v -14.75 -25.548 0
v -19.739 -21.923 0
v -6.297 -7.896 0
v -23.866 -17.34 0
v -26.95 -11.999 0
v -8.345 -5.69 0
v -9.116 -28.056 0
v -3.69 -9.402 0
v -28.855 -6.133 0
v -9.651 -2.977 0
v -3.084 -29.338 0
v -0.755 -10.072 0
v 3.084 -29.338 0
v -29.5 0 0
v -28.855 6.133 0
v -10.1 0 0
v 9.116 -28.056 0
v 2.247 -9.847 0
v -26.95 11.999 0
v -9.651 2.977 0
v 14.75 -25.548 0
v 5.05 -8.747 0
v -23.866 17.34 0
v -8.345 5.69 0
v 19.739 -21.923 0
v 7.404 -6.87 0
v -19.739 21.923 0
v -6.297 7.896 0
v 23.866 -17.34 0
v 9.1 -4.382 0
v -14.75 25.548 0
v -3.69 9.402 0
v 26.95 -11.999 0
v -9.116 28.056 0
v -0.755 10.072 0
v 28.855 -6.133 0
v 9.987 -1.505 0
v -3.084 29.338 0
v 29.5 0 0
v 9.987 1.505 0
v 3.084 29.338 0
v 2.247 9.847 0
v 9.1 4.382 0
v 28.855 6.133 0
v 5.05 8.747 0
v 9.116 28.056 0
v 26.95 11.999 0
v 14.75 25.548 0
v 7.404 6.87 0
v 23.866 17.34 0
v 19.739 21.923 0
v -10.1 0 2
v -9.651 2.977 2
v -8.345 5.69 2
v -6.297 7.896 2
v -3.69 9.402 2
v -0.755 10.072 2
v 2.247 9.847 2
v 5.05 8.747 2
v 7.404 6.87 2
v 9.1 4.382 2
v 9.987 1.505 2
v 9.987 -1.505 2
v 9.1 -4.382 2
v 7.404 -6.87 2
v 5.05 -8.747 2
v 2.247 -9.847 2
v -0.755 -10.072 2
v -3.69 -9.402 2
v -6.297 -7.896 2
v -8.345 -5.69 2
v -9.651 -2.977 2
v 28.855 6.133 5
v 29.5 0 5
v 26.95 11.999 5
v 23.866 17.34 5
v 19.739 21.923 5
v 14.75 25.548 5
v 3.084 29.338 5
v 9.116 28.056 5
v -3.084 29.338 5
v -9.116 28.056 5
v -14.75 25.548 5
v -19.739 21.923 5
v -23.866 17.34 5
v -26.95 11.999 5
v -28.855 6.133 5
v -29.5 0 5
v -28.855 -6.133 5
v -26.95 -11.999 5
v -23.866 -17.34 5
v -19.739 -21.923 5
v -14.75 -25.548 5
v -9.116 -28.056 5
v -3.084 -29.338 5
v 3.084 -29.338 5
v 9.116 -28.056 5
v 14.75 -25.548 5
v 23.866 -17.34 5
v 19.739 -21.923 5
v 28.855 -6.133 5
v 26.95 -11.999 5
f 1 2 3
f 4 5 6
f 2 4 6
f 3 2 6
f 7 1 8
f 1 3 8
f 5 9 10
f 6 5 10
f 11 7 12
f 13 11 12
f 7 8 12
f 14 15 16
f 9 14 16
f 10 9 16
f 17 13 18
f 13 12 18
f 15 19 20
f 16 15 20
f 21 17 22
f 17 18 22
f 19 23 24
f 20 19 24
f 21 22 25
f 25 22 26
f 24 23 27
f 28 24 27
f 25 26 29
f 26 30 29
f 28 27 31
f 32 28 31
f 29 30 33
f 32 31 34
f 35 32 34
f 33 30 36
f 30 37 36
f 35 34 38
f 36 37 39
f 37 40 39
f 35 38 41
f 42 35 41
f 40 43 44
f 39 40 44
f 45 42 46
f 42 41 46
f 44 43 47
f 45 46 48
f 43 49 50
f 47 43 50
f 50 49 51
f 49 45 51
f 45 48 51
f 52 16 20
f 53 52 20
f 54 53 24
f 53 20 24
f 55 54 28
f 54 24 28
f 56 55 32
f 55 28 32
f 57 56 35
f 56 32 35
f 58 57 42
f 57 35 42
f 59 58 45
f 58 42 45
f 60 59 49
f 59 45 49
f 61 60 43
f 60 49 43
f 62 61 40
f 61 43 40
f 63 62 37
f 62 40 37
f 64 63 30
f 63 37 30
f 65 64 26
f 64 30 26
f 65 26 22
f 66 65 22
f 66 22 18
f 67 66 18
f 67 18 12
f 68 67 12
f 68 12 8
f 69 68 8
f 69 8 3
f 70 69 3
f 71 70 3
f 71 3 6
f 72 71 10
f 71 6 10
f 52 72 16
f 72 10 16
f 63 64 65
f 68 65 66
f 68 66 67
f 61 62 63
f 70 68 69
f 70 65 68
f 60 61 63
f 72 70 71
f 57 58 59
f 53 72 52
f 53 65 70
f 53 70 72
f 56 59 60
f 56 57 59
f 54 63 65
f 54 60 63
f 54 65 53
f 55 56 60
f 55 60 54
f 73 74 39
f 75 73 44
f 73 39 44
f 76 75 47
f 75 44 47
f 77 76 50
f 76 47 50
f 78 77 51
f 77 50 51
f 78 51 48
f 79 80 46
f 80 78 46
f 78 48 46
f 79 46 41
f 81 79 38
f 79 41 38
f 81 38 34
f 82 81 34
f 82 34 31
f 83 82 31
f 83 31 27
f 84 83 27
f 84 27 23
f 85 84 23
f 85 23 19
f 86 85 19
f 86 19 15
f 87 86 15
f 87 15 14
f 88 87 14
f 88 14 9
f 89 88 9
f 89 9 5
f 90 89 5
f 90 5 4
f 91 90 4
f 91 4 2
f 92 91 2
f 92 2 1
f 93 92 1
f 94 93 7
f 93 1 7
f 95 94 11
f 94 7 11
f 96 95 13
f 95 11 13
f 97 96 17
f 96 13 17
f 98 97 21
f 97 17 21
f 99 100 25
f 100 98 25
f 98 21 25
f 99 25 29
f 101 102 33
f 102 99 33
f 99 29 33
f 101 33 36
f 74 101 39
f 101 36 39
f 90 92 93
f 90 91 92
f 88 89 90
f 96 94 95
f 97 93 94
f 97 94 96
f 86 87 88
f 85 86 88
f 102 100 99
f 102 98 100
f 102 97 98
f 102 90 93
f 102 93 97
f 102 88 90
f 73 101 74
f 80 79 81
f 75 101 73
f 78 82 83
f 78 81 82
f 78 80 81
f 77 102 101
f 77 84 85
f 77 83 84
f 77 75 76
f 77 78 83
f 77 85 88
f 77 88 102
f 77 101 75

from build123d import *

# Parameters (mm, degrees)
SKETCH2_R           = 29.5
BOSS_EXTRUDE1_DEPTH = 60
CUT_REVOLVE1_ANGLE  = 180
CUT_EXTRUDE1_REACH  = 12
SKETCH5_W           = 91.768804765
SKETCH5_H           = 88.75511019
SKETCH6_R           = 10.1
CUT_EXTRUDE2_DEPTH  = 2
SKETCH7_W           = 64.282541495
SKETCH7_H           = 65.701050647
CUT_EXTRUDE3_DEPTH  = 45


with BuildPart() as part:
    # Sketch2 → Boss-Extrude1 (new body)
    with BuildSketch(Plane.XY):
        Circle(SKETCH2_R)
    extrude(amount=BOSS_EXTRUDE1_DEPTH)

    # Sketch4 → Cut-Revolve1 (revolve, cut)
    with BuildSketch(Plane.XY.offset(55)):
        with BuildLine():
            Line((-16.25, 0), (16.25, 0))
            ThreePointArc((16.25, 0), (0, 16.25), (-16.25, 0))
        make_face()
    revolve(axis=Axis((-16.25, 0, 55), (-1, 0, 0)), revolution_arc=CUT_REVOLVE1_ANGLE, mode=Mode.SUBTRACT)

    # Sketch5 → Cut-Extrude1 (cut, up to next)
    with BuildSketch(Plane.XY.offset(50), mode=Mode.PRIVATE) as cut_extrude1_sk1:
        with Locations((1.214417884, -2.093280901)):
            Rectangle(SKETCH5_W, SKETCH5_H)
    cut_extrude1_tool1 = extrude(cut_extrude1_sk1.sketch, amount=CUT_EXTRUDE1_REACH, mode=Mode.PRIVATE) & part.part
    add(cut_extrude1_tool1.solids().sort_by_distance((1.214418, -2.093281, 50))[0], mode=Mode.SUBTRACT)

    # Sketch6 → Cut-Extrude2 (cut)
    with BuildSketch(Plane(origin=(0, 0, 0), x_dir=(-1, 0, 0), z_dir=(0, 0, -1))):
        Circle(SKETCH6_R)
    extrude(amount=-CUT_EXTRUDE2_DEPTH, mode=Mode.SUBTRACT)

    # Sketch7 → Cut-Extrude3 (cut)
    with BuildSketch(Plane.XY.offset(50)):
        with Locations((0.667192443, 0.630931985)):
            Rectangle(SKETCH7_W, SKETCH7_H)
    extrude(amount=-CUT_EXTRUDE3_DEPTH, mode=Mode.SUBTRACT)


solid = part.part
